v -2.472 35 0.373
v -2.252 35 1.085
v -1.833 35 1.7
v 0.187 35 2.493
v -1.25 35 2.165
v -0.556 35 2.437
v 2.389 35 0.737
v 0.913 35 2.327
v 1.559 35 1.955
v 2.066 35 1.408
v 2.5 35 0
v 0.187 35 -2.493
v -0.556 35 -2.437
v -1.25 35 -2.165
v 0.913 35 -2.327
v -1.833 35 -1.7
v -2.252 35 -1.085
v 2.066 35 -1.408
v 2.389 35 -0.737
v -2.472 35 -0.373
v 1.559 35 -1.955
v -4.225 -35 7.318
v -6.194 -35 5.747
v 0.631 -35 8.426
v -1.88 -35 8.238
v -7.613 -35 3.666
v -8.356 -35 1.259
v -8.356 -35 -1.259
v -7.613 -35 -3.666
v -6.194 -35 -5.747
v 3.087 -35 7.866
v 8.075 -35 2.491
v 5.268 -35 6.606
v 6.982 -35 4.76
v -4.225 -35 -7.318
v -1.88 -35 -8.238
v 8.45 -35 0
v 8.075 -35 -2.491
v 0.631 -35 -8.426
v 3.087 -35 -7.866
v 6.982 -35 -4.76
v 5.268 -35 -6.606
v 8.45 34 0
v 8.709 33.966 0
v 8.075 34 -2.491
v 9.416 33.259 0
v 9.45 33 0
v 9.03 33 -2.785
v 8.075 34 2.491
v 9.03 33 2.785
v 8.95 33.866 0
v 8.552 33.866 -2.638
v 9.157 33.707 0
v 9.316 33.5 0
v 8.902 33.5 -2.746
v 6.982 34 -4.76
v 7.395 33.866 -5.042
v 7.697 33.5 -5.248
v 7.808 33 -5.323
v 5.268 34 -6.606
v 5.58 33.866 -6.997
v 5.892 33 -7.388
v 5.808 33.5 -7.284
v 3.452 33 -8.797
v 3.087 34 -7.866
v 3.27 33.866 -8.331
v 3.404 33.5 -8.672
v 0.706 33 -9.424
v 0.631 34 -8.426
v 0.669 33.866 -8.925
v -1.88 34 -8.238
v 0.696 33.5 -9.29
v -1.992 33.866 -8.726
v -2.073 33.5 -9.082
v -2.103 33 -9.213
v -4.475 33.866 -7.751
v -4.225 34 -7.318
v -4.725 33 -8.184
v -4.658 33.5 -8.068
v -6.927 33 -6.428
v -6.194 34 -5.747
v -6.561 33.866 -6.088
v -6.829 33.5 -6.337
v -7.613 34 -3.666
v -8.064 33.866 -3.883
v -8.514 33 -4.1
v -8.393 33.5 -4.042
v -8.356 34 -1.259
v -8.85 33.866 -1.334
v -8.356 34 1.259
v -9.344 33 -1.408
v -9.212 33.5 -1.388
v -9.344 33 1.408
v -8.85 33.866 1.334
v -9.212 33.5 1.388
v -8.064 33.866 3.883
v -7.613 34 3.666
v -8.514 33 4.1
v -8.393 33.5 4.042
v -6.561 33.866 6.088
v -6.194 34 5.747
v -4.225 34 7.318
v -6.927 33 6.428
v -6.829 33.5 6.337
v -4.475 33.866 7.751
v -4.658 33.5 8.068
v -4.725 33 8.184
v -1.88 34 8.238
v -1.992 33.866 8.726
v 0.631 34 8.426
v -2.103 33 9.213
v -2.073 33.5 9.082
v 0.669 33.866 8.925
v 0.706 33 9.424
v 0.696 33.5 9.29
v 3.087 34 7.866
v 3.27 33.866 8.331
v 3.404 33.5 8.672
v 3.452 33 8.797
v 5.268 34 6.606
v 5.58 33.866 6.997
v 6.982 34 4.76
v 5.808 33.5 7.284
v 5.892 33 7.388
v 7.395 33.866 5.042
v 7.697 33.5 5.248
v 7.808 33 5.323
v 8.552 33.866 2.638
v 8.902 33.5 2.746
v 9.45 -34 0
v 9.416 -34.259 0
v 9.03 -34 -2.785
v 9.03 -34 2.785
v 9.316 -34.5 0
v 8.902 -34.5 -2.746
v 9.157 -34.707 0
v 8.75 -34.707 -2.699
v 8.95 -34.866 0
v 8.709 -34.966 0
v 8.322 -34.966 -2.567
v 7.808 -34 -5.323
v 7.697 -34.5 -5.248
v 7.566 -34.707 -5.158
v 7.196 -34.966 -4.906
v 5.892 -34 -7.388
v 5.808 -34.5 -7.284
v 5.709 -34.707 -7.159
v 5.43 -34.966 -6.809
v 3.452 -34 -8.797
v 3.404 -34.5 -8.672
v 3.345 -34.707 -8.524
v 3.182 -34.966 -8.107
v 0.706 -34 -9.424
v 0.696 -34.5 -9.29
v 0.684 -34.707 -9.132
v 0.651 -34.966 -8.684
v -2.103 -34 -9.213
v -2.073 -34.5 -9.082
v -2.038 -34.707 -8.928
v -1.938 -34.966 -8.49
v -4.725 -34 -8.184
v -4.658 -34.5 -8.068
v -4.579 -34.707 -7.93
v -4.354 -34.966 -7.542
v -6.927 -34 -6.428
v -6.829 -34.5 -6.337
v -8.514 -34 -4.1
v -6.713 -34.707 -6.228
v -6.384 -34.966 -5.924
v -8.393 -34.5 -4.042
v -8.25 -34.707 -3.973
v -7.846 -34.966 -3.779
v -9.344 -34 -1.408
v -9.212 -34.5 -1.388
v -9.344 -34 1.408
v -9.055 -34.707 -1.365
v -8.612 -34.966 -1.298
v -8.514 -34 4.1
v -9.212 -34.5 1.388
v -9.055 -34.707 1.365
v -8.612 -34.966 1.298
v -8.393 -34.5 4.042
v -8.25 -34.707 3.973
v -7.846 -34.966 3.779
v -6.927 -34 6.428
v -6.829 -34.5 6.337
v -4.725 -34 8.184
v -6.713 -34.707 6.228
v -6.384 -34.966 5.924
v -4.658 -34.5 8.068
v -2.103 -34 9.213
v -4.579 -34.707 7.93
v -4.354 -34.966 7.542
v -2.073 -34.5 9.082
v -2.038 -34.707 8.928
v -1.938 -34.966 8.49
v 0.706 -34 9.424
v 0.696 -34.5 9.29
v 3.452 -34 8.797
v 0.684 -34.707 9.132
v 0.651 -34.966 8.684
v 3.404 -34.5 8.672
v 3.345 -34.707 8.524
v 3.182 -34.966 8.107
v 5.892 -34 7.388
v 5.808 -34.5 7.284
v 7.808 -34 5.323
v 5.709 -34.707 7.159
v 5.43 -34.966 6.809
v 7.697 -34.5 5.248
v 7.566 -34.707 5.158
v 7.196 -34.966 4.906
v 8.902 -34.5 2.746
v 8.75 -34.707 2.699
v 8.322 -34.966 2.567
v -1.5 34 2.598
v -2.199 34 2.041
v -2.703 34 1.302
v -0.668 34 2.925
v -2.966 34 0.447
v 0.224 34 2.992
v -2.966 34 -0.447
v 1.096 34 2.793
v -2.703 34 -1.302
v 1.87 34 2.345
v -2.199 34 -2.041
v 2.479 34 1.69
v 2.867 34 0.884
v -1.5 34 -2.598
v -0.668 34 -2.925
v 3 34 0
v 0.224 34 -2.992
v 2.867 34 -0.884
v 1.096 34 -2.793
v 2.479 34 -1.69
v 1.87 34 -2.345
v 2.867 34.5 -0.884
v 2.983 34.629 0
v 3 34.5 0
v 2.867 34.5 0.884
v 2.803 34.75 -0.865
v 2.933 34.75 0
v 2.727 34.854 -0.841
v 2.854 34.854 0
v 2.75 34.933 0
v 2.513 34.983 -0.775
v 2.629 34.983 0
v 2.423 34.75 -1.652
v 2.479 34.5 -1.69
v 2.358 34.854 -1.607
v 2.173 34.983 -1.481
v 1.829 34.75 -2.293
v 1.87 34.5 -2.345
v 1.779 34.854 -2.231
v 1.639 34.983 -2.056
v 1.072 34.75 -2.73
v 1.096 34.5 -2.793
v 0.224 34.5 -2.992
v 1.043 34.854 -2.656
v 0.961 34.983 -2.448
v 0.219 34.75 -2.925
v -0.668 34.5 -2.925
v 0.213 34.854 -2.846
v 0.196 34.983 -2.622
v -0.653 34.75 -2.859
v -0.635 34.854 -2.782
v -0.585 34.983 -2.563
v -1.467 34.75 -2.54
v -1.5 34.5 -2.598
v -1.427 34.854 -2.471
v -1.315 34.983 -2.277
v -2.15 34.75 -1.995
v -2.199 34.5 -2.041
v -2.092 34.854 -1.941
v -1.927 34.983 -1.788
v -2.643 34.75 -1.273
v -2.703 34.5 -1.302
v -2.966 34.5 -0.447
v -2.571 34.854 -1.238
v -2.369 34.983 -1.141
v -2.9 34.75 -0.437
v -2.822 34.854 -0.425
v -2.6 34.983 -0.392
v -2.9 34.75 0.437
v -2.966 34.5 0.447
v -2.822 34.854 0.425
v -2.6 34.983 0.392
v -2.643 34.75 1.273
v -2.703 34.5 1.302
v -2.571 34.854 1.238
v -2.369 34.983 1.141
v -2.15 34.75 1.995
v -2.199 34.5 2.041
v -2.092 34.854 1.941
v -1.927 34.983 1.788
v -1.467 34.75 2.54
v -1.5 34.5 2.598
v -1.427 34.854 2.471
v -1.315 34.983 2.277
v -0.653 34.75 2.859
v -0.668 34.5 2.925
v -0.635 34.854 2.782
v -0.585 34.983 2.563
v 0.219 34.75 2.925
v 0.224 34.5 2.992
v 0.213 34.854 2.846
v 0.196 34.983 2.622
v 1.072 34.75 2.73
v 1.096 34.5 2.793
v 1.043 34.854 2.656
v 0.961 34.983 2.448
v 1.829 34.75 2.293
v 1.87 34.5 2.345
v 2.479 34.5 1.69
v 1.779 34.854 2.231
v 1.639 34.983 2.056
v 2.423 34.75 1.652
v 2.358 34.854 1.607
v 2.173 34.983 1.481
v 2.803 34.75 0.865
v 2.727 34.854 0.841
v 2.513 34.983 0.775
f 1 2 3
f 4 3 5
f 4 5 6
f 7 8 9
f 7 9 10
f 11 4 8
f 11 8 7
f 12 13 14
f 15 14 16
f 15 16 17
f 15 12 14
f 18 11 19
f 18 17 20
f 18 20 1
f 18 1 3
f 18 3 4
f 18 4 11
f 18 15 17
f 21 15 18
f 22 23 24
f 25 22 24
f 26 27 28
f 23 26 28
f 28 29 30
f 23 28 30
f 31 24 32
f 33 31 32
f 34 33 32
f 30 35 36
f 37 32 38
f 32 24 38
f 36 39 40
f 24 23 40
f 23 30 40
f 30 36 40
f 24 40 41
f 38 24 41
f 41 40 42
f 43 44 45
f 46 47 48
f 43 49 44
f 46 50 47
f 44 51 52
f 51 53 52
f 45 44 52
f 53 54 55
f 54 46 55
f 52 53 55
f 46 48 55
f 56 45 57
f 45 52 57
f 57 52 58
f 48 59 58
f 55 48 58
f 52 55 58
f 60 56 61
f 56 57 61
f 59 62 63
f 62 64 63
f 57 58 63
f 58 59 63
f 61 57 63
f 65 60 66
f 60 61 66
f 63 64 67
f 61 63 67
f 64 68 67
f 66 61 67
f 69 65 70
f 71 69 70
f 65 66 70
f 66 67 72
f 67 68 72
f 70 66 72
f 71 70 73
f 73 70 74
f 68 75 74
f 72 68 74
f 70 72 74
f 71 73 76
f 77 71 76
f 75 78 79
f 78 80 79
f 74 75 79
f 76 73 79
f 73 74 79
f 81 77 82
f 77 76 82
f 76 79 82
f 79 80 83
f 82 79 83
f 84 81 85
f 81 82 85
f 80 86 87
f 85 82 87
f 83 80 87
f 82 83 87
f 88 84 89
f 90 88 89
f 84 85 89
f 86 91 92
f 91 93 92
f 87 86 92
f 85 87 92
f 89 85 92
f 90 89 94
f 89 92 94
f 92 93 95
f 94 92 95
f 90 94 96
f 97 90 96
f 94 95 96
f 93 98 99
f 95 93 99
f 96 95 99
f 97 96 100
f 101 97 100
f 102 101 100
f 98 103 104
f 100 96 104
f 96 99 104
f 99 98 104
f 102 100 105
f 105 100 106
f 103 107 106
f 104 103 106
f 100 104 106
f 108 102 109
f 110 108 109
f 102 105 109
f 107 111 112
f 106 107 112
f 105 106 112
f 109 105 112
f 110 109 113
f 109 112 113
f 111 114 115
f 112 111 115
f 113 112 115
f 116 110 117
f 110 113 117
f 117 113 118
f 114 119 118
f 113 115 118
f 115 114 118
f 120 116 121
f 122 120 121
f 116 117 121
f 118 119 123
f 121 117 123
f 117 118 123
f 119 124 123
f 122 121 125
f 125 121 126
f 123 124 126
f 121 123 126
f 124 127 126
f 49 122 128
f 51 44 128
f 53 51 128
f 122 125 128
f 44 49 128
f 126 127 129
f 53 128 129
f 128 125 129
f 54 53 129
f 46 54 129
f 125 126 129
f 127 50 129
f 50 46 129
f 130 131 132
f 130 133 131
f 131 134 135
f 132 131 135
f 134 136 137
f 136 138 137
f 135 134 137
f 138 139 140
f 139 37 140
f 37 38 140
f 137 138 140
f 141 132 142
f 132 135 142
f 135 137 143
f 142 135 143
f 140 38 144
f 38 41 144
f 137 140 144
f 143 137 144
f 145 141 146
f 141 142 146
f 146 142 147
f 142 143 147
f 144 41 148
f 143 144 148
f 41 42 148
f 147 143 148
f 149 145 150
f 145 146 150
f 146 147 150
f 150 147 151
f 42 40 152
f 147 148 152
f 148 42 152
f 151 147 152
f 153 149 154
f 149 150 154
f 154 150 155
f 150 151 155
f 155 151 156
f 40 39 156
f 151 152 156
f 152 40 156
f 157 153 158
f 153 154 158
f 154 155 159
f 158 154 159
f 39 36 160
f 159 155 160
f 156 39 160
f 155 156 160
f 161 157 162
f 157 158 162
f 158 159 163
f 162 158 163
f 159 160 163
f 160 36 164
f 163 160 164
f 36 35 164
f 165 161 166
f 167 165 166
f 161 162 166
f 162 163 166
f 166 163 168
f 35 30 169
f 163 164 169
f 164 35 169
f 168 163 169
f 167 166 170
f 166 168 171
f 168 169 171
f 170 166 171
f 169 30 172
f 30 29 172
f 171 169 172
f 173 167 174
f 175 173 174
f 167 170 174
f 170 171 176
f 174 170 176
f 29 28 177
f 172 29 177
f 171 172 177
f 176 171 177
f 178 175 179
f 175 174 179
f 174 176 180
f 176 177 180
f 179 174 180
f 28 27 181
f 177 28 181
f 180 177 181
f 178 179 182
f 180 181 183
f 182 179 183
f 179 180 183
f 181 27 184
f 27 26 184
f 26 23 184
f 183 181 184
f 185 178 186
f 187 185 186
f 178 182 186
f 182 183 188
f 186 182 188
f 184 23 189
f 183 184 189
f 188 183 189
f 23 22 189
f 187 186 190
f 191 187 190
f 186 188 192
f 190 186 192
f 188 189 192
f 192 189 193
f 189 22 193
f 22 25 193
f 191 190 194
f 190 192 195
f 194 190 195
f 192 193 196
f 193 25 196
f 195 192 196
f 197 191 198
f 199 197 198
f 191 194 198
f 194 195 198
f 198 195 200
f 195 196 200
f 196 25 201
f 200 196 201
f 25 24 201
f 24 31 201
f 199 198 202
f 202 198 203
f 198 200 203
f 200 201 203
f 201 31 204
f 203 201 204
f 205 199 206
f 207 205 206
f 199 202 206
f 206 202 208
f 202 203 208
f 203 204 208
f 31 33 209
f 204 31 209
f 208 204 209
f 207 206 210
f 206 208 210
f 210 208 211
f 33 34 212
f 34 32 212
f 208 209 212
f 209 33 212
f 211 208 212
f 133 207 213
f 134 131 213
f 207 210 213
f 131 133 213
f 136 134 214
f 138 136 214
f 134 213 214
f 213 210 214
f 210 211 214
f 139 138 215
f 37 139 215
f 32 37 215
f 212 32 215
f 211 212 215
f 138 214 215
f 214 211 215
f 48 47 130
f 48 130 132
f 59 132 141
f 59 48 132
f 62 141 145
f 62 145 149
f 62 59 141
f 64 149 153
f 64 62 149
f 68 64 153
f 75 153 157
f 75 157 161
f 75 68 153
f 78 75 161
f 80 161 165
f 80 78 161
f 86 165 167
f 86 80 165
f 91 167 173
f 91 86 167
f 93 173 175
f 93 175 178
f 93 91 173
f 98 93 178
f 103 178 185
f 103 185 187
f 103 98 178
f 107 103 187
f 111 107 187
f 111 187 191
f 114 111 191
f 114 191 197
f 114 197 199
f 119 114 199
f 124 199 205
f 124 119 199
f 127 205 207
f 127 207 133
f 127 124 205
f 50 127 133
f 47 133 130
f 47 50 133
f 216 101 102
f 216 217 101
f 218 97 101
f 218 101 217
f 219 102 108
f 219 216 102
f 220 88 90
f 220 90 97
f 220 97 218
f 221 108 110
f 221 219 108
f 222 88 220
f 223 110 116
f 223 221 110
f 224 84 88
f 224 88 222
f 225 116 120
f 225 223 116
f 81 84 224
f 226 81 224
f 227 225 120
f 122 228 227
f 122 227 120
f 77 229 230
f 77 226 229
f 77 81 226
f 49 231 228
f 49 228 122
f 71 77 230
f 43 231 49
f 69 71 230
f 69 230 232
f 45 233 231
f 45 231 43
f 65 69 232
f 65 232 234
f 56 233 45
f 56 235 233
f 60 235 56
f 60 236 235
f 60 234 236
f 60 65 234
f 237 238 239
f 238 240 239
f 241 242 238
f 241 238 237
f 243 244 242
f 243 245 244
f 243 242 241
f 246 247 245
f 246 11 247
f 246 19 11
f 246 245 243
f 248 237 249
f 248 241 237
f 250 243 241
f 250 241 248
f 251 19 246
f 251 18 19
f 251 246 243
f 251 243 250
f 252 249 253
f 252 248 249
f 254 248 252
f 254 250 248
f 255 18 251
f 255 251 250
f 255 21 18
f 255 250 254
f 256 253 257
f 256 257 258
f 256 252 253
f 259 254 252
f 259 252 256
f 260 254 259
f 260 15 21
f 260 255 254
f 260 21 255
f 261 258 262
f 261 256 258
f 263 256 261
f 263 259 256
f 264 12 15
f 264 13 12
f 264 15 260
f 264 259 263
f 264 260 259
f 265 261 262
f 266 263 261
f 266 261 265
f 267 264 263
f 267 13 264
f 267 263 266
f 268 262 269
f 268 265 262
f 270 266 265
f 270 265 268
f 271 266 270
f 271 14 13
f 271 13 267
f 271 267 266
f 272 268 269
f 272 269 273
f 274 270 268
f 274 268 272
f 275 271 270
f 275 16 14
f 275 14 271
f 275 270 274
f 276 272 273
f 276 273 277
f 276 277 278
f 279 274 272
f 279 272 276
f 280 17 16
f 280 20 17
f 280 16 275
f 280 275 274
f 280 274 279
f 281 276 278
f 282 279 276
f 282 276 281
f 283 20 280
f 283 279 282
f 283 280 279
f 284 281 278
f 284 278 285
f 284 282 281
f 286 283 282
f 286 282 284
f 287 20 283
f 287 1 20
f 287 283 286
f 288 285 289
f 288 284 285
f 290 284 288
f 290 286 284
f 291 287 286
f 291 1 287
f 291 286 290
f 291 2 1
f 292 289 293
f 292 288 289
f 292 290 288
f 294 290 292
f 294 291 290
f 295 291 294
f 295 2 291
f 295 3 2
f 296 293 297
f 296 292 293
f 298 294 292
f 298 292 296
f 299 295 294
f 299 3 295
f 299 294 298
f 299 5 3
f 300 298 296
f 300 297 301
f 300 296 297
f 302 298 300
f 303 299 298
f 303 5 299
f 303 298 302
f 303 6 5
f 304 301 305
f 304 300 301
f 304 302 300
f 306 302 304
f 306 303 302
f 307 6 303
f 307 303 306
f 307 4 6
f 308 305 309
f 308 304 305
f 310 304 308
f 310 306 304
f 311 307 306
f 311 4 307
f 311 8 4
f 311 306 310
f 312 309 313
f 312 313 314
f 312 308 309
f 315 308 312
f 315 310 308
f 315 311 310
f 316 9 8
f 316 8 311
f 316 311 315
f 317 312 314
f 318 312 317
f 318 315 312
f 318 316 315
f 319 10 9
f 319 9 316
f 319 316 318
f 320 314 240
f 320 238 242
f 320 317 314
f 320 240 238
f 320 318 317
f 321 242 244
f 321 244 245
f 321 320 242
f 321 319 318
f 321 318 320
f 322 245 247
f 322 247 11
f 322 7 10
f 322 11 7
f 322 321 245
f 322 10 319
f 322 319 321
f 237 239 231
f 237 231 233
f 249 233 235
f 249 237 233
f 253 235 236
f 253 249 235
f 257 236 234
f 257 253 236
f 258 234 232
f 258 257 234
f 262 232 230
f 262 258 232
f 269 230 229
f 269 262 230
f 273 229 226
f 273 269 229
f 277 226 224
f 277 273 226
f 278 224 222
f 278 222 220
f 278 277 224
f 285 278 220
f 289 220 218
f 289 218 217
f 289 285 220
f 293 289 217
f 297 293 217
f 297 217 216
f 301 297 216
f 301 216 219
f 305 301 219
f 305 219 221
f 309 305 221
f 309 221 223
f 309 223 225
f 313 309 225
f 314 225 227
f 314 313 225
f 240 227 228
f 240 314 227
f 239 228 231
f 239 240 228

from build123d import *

# Parameters (mm, degrees)
BOSS_EXTRUDE1_DEPTH      = 35
BOSS_EXTRUDE1_DEPTH_BACK = 35
SKETCH1_R                = 9.45
SKETCH2_R                = 9.45
SKETCH2_R_2              = 3
CUT_EXTRUDE1_DEPTH       = 1
FILLET1_R                = 0.5
FILLET2_R                = 1


with BuildPart() as part:
    # Sketch1 → Boss-Extrude1 (new, two sides: drawn at the far end of the back side and taken through both)
    with BuildSketch(Plane(origin=(0, 0, 0), x_dir=(1, 0, 0), z_dir=(0, 1, 0)).offset(-BOSS_EXTRUDE1_DEPTH_BACK)):
        Circle(SKETCH1_R)
    extrude(amount=BOSS_EXTRUDE1_DEPTH + BOSS_EXTRUDE1_DEPTH_BACK)

    # Sketch2 → Cut-Extrude1 (cut)
    with BuildSketch(Plane(origin=(0, 35, 0), x_dir=(1, 0, 0), z_dir=(0, 1, 0))):
        Circle(SKETCH2_R)
        Circle(SKETCH2_R_2, mode=Mode.SUBTRACT)
    extrude(amount=-CUT_EXTRUDE1_DEPTH, mode=Mode.SUBTRACT)

    # Fillet1
    fillet1_edges = [part.edges().sort_by_distance(p)[0] for p in [
        (-3, 35, 0),
    ]]
    fillet(fillet1_edges, radius=FILLET1_R)

    # Fillet2
    fillet2_edges = [part.edges().sort_by_distance(p)[0] for p in [
        (-9.45, -35, 0),
        (-9.45, 34, 0),
    ]]
    fillet(fillet2_edges, radius=FILLET2_R)


solid = part.part
